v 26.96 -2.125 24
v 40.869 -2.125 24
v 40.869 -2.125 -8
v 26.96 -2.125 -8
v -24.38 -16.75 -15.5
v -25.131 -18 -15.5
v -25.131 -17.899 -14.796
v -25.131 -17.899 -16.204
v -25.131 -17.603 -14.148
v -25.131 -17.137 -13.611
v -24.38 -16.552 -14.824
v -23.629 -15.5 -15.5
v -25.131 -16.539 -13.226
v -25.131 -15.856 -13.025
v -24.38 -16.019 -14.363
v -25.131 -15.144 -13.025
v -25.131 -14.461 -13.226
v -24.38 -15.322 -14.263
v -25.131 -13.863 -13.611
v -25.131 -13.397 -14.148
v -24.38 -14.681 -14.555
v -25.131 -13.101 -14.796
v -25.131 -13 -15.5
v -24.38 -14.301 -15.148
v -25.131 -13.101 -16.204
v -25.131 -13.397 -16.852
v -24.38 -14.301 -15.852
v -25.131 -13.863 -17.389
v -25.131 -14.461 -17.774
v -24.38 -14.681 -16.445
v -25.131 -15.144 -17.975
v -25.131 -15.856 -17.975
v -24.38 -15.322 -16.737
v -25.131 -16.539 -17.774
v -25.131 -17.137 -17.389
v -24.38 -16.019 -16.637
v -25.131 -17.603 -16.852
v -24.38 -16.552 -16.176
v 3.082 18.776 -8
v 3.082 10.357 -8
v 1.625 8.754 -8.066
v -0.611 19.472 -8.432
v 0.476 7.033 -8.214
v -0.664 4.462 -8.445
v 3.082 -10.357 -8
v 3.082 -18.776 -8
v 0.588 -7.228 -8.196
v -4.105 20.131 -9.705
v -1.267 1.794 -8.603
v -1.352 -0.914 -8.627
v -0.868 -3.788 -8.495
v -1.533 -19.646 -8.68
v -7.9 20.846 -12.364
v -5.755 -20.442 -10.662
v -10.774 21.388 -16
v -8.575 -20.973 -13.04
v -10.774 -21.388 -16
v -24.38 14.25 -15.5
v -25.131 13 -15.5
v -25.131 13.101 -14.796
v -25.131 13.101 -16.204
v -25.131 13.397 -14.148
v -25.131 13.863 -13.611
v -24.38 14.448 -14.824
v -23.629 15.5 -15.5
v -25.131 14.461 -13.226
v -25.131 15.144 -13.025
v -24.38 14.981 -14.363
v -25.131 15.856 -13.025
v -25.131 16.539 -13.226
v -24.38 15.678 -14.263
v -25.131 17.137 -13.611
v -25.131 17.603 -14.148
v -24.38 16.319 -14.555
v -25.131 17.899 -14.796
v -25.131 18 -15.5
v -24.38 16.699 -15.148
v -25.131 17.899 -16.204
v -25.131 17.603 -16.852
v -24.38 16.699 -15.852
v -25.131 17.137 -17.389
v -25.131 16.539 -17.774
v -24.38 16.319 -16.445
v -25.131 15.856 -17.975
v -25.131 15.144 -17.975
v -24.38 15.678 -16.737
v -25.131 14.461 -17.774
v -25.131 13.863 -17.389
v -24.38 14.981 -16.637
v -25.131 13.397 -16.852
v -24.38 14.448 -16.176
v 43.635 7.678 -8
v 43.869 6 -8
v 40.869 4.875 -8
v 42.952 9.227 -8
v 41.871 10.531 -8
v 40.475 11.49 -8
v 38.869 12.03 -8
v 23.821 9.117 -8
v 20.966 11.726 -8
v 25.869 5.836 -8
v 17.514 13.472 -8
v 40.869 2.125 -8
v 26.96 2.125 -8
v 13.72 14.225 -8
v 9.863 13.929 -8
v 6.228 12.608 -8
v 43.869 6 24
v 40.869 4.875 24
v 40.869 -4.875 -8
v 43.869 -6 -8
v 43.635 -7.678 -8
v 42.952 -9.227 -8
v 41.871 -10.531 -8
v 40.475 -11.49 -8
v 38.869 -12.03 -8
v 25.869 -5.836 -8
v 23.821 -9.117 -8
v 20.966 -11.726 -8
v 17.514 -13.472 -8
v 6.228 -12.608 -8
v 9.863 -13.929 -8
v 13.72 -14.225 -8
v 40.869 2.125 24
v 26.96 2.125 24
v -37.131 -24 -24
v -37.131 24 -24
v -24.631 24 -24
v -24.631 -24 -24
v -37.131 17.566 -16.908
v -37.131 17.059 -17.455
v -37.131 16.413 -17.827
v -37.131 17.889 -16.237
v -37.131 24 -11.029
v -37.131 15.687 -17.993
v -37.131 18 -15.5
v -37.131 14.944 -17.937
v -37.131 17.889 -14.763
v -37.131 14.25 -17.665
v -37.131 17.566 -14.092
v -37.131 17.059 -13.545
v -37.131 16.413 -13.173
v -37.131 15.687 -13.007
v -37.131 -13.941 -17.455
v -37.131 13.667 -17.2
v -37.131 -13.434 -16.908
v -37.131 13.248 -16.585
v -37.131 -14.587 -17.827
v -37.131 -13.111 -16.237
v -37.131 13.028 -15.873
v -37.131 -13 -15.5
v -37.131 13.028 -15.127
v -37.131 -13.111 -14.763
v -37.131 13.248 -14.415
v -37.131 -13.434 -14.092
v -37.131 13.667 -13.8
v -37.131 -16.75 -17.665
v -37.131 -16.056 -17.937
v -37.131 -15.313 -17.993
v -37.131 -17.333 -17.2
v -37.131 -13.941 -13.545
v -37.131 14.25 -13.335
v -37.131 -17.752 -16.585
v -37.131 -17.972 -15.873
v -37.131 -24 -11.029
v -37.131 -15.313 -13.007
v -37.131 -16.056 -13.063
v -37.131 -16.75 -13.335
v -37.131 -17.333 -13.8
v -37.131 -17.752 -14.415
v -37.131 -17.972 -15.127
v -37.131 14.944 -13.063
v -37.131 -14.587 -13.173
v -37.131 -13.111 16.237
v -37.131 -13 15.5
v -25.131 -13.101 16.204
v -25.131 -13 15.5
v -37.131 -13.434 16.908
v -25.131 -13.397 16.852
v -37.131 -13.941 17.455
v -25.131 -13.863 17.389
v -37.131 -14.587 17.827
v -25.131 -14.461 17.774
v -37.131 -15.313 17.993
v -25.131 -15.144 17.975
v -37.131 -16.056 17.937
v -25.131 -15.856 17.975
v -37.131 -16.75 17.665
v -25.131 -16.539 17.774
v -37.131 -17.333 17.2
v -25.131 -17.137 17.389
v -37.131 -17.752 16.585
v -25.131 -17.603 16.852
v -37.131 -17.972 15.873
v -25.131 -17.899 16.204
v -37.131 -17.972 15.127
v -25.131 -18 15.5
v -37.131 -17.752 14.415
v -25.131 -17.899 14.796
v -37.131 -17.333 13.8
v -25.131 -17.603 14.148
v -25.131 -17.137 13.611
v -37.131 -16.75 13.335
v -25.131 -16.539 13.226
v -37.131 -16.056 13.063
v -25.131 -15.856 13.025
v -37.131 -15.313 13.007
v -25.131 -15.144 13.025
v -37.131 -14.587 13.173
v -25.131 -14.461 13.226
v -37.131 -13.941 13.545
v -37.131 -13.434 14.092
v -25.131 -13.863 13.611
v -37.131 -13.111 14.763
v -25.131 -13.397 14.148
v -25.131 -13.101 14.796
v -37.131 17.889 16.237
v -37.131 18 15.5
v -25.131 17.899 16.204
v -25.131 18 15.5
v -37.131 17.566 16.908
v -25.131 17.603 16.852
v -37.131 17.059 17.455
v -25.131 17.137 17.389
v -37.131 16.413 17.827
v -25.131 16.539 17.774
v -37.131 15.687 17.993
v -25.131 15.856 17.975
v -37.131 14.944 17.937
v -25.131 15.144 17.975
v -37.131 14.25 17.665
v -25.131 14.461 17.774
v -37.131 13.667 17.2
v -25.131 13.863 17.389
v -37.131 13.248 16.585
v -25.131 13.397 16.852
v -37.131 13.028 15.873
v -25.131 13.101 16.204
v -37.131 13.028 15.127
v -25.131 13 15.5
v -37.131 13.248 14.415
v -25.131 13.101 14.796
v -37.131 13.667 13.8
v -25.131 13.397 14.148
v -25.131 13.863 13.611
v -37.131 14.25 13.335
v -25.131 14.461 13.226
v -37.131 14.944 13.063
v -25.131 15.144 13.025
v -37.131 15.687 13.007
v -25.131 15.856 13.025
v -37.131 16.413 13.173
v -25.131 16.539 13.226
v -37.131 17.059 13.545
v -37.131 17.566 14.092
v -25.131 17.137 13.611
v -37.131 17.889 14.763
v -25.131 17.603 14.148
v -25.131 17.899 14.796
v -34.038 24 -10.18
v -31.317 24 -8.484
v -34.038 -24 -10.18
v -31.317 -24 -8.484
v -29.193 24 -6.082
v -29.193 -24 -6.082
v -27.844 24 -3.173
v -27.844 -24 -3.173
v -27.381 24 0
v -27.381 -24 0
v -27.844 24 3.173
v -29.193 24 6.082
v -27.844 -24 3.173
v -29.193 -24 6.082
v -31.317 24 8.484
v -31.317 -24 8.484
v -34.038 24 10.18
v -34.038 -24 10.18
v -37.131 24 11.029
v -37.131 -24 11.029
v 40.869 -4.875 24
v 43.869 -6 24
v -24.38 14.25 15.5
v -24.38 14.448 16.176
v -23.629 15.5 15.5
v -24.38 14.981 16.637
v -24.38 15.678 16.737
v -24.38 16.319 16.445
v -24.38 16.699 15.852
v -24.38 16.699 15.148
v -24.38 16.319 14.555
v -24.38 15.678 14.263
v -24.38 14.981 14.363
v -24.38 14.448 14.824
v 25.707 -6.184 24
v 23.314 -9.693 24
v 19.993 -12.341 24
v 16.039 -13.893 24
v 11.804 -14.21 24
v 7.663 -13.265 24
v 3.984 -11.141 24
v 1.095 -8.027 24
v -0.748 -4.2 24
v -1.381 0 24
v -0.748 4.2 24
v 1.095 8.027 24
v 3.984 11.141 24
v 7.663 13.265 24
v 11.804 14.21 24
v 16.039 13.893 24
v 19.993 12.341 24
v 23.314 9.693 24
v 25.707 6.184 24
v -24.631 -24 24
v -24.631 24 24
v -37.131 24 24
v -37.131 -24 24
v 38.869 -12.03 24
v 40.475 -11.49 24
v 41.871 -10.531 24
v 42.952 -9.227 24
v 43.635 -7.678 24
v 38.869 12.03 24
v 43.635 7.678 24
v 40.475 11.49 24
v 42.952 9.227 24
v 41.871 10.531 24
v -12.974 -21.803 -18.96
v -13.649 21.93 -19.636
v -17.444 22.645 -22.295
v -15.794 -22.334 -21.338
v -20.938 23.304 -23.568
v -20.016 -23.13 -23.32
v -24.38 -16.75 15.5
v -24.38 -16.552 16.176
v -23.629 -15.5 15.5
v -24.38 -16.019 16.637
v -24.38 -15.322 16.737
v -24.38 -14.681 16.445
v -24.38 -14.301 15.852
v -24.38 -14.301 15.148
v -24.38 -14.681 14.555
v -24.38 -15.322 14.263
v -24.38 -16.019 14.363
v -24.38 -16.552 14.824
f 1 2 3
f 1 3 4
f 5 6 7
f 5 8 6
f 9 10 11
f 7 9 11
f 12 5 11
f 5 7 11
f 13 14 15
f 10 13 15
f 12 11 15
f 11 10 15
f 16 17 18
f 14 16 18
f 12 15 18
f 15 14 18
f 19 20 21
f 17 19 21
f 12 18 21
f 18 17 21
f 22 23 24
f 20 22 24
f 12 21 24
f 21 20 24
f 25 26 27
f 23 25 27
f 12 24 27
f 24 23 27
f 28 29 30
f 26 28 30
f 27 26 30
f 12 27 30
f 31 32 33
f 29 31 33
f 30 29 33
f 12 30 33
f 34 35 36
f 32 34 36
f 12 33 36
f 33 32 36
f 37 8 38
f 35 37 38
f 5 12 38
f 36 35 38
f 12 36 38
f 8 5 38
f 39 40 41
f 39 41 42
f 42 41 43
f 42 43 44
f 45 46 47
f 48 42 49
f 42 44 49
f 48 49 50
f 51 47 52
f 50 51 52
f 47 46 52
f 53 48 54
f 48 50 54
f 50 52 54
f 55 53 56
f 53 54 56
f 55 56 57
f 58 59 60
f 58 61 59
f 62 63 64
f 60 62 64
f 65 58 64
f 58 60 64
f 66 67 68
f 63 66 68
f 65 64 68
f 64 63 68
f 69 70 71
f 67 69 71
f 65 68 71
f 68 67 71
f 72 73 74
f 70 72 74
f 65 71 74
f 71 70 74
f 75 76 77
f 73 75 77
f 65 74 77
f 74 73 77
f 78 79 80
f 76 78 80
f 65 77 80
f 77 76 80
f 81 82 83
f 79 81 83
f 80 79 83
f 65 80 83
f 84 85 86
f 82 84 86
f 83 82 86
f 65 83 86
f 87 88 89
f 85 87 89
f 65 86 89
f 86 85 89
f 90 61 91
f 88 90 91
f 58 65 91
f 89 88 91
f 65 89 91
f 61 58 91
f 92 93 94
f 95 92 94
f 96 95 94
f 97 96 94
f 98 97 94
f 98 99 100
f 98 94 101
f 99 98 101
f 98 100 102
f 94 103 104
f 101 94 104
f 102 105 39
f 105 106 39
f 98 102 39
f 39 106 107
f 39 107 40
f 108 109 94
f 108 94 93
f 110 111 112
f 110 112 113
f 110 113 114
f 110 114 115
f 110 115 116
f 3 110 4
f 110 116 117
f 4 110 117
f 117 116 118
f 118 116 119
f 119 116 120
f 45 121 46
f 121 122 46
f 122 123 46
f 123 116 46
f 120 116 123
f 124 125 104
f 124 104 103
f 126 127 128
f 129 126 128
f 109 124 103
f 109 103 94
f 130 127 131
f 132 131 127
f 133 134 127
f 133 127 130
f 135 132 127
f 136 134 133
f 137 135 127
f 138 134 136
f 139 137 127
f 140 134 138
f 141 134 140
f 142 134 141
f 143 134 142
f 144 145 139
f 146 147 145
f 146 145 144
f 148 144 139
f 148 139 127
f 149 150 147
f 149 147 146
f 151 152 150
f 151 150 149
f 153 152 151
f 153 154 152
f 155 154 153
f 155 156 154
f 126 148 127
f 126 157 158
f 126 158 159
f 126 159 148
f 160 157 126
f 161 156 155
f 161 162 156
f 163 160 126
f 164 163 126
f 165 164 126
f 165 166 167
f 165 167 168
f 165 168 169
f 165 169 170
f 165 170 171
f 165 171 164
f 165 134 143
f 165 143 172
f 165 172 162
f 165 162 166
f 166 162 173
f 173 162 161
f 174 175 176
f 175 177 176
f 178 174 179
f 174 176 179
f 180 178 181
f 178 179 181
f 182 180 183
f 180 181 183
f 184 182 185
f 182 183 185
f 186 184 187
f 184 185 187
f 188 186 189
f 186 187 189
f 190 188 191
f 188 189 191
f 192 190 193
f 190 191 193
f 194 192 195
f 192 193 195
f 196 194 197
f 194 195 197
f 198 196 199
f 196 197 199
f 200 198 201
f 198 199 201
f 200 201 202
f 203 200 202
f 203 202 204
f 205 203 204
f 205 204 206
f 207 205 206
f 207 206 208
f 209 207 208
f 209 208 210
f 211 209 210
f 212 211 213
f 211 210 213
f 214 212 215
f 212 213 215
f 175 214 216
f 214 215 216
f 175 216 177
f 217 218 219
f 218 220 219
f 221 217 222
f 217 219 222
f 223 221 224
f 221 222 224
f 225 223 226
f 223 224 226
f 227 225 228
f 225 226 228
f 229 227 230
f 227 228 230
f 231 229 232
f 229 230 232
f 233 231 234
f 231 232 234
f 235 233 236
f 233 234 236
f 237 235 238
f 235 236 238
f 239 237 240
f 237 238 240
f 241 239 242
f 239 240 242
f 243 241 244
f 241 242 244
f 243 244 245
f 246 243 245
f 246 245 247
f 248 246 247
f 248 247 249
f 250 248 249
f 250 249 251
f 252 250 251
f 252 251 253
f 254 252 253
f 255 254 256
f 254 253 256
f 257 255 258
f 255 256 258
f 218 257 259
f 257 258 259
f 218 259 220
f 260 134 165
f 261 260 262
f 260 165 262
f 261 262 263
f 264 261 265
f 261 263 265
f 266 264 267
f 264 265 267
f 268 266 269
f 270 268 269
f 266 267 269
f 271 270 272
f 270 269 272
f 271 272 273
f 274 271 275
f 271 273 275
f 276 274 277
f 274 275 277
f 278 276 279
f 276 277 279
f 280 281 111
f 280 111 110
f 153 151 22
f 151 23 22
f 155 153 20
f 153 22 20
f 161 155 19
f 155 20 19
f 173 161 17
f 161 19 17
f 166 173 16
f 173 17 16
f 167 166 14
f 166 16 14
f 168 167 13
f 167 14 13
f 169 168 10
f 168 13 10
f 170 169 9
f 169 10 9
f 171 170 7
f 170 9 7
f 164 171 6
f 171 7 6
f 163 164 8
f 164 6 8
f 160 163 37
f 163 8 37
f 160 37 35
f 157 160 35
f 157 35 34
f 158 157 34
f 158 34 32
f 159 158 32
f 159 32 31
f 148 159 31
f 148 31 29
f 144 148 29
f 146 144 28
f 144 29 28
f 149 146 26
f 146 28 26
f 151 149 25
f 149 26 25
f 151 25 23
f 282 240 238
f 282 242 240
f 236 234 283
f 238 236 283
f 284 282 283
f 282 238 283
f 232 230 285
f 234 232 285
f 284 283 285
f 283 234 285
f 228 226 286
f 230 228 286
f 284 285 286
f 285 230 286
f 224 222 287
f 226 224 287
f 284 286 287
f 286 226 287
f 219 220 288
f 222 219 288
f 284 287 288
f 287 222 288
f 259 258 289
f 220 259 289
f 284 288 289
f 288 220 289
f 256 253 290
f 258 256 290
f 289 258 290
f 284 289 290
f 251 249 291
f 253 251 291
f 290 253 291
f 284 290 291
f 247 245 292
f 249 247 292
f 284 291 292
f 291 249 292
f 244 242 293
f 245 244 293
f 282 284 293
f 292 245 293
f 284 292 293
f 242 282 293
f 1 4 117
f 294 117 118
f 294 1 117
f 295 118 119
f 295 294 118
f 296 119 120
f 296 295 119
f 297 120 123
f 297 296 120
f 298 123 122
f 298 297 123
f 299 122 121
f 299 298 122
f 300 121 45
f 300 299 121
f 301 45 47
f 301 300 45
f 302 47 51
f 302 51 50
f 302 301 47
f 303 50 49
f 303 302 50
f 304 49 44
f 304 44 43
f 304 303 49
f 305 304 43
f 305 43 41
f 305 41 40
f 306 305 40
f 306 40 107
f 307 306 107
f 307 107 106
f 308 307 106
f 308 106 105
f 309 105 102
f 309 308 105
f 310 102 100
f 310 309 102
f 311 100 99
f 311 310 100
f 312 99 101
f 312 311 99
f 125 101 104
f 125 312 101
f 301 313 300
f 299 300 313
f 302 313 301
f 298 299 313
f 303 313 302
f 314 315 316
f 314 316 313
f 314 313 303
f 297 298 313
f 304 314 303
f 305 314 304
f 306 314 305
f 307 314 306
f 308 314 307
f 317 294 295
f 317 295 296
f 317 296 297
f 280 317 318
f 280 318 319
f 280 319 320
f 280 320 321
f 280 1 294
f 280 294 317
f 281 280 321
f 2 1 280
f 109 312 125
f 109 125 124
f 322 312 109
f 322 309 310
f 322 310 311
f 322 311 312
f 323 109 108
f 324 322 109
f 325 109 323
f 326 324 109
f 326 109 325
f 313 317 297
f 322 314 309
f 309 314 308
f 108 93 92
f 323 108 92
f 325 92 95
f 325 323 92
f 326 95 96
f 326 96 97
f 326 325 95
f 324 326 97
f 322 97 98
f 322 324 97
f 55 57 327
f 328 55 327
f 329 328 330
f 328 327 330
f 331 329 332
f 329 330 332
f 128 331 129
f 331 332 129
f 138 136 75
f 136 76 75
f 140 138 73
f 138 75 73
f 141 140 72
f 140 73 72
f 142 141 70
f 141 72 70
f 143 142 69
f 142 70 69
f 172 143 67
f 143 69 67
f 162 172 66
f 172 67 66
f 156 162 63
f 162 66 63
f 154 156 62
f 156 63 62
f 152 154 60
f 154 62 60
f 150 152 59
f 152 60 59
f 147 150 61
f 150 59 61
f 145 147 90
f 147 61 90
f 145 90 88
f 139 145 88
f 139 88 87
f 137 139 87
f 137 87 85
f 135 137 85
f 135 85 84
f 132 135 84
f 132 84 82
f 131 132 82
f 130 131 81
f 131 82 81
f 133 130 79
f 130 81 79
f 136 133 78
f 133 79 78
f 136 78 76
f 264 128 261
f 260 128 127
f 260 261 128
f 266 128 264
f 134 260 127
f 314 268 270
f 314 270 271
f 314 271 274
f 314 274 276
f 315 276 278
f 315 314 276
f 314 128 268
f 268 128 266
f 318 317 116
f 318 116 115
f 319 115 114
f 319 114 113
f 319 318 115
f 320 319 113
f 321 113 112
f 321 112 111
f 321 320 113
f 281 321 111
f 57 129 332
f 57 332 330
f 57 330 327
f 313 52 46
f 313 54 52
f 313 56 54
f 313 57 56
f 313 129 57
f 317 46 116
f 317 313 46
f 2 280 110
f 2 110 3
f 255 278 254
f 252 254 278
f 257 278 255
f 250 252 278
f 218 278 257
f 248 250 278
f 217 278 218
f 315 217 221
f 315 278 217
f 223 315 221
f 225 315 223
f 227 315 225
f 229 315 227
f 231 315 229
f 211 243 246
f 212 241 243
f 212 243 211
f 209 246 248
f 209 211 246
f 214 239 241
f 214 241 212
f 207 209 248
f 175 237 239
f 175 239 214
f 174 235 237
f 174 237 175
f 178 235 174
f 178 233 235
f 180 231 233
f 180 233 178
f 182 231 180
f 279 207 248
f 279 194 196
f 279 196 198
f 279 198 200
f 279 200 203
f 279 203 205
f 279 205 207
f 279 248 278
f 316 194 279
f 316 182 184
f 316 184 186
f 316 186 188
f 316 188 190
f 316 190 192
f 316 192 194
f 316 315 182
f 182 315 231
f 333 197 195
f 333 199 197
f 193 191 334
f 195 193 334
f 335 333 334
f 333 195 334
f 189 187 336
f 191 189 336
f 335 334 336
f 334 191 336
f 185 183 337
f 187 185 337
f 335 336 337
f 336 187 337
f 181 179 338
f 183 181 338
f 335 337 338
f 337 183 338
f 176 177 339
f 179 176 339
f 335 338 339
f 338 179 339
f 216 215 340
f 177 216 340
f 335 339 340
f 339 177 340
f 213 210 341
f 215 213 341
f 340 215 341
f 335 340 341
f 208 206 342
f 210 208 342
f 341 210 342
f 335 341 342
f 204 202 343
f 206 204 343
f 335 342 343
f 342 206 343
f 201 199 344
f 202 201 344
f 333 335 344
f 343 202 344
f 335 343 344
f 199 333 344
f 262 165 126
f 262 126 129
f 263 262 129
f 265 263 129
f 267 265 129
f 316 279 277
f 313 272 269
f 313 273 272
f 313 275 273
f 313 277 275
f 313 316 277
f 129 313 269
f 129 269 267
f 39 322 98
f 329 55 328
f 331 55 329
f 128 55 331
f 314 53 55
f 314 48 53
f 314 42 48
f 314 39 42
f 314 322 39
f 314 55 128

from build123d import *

# Parameters (mm, degrees)
F1_DEPTH = 24
F3_DEPTH = 48
F5_DEPTH = 48
F7_D     = 5
F7_DEPTH = 12
F7_TIP   = 1.5021515476


with BuildPart() as f1:
    # F0 (on Top) → F1 (new body, symmetric)
    with BuildSketch(Plane.XY):
        with BuildLine():
            Line((-24.6308942474, 24), (-37.1308942474, 24))
            Line((-37.1308942474, 24), (-37.1308942474, 0))
            Line((-37.1308942474, 0), (-37.1308942474, -24))
            Line((-37.1308942474, -24), (-24.6308942474, -24))
            Line((-24.6308942474, -24), (38.8693180593, -12.0302915725))
            ThreePointArc((38.8693180593, -12.0302915725), (42.4565903396, -9.9167044), (43.8691057526, -6))
            Line((43.8691057526, -6), (40.8691057526, -4.875))
            Line((40.8691057526, -4.875), (40.8691057526, -2.125))
            Line((40.8691057526, -2.125), (26.9597719895, -2.125))
            ThreePointArc((26.9597719895, -2.125), (-1.3808942474, 0), (26.9597719895, 2.125))
            Line((26.9597719895, 2.125), (40.8691057526, 2.125))
            Line((40.8691057526, 2.125), (40.8691057526, 4.875))
            Line((40.8691057526, 4.875), (43.8691057526, 6))
            ThreePointArc((43.8691057526, 6), (42.4565903396, 9.9167044), (38.8693180593, 12.0302915725))
            Line((38.8693180593, 12.0302915725), (-24.6308942474, 24))
        make_face()
    extrude(amount=F1_DEPTH, both=True)

    # F2 (on face) → F3 (cut, through all)
    with BuildSketch(Plane.XZ.offset(24)):
        with BuildLine():
            ThreePointArc((-10.7744877868, -16), (-16.6308942474, -21.8564064606), (-24.6308942474, -24))
            Line((-24.6308942474, -24), (48.1037423015, -24))
            Line((48.1037423015, -24), (48.1037423015, -8))
            Line((48.1037423015, -8), (3.0819186737, -8))
            ThreePointArc((3.0819186737, -8), (-4.9180813263, -10.1435935394), (-10.7744877868, -16))
        make_face()
    extrude(amount=-F3_DEPTH, mode=Mode.SUBTRACT)

    # F4 (on face) → F5 (cut, through all)
    with BuildSketch(Plane.XZ.offset(24)):
        with BuildLine():
            Line((-37.1308942474, 11.0286558564), (-37.1308942474, -11.0286558564))
            ThreePointArc((-37.1308942474, -11.0286558564), (-27.3808942474, 0), (-37.1308942474, 11.0286558564))
        make_face()
    extrude(amount=-F5_DEPTH, mode=Mode.SUBTRACT)

    # F7
    with Locations(Plane(origin=(-37.1308942474, 0, 0), x_dir=(0, -1, 0), z_dir=(-1, 0, 0))):
        with Locations((-15.5, 15.5), (15.5, 15.5), (15.5, -15.5), (-15.5, -15.5)):
            Hole(F7_D / 2, depth=F7_DEPTH)
            with Locations((0, 0, -(F7_DEPTH + F7_TIP / 2))):  # 118° drill point
                Cone(0, F7_D / 2, F7_TIP, mode=Mode.SUBTRACT)


solid = f1.part
